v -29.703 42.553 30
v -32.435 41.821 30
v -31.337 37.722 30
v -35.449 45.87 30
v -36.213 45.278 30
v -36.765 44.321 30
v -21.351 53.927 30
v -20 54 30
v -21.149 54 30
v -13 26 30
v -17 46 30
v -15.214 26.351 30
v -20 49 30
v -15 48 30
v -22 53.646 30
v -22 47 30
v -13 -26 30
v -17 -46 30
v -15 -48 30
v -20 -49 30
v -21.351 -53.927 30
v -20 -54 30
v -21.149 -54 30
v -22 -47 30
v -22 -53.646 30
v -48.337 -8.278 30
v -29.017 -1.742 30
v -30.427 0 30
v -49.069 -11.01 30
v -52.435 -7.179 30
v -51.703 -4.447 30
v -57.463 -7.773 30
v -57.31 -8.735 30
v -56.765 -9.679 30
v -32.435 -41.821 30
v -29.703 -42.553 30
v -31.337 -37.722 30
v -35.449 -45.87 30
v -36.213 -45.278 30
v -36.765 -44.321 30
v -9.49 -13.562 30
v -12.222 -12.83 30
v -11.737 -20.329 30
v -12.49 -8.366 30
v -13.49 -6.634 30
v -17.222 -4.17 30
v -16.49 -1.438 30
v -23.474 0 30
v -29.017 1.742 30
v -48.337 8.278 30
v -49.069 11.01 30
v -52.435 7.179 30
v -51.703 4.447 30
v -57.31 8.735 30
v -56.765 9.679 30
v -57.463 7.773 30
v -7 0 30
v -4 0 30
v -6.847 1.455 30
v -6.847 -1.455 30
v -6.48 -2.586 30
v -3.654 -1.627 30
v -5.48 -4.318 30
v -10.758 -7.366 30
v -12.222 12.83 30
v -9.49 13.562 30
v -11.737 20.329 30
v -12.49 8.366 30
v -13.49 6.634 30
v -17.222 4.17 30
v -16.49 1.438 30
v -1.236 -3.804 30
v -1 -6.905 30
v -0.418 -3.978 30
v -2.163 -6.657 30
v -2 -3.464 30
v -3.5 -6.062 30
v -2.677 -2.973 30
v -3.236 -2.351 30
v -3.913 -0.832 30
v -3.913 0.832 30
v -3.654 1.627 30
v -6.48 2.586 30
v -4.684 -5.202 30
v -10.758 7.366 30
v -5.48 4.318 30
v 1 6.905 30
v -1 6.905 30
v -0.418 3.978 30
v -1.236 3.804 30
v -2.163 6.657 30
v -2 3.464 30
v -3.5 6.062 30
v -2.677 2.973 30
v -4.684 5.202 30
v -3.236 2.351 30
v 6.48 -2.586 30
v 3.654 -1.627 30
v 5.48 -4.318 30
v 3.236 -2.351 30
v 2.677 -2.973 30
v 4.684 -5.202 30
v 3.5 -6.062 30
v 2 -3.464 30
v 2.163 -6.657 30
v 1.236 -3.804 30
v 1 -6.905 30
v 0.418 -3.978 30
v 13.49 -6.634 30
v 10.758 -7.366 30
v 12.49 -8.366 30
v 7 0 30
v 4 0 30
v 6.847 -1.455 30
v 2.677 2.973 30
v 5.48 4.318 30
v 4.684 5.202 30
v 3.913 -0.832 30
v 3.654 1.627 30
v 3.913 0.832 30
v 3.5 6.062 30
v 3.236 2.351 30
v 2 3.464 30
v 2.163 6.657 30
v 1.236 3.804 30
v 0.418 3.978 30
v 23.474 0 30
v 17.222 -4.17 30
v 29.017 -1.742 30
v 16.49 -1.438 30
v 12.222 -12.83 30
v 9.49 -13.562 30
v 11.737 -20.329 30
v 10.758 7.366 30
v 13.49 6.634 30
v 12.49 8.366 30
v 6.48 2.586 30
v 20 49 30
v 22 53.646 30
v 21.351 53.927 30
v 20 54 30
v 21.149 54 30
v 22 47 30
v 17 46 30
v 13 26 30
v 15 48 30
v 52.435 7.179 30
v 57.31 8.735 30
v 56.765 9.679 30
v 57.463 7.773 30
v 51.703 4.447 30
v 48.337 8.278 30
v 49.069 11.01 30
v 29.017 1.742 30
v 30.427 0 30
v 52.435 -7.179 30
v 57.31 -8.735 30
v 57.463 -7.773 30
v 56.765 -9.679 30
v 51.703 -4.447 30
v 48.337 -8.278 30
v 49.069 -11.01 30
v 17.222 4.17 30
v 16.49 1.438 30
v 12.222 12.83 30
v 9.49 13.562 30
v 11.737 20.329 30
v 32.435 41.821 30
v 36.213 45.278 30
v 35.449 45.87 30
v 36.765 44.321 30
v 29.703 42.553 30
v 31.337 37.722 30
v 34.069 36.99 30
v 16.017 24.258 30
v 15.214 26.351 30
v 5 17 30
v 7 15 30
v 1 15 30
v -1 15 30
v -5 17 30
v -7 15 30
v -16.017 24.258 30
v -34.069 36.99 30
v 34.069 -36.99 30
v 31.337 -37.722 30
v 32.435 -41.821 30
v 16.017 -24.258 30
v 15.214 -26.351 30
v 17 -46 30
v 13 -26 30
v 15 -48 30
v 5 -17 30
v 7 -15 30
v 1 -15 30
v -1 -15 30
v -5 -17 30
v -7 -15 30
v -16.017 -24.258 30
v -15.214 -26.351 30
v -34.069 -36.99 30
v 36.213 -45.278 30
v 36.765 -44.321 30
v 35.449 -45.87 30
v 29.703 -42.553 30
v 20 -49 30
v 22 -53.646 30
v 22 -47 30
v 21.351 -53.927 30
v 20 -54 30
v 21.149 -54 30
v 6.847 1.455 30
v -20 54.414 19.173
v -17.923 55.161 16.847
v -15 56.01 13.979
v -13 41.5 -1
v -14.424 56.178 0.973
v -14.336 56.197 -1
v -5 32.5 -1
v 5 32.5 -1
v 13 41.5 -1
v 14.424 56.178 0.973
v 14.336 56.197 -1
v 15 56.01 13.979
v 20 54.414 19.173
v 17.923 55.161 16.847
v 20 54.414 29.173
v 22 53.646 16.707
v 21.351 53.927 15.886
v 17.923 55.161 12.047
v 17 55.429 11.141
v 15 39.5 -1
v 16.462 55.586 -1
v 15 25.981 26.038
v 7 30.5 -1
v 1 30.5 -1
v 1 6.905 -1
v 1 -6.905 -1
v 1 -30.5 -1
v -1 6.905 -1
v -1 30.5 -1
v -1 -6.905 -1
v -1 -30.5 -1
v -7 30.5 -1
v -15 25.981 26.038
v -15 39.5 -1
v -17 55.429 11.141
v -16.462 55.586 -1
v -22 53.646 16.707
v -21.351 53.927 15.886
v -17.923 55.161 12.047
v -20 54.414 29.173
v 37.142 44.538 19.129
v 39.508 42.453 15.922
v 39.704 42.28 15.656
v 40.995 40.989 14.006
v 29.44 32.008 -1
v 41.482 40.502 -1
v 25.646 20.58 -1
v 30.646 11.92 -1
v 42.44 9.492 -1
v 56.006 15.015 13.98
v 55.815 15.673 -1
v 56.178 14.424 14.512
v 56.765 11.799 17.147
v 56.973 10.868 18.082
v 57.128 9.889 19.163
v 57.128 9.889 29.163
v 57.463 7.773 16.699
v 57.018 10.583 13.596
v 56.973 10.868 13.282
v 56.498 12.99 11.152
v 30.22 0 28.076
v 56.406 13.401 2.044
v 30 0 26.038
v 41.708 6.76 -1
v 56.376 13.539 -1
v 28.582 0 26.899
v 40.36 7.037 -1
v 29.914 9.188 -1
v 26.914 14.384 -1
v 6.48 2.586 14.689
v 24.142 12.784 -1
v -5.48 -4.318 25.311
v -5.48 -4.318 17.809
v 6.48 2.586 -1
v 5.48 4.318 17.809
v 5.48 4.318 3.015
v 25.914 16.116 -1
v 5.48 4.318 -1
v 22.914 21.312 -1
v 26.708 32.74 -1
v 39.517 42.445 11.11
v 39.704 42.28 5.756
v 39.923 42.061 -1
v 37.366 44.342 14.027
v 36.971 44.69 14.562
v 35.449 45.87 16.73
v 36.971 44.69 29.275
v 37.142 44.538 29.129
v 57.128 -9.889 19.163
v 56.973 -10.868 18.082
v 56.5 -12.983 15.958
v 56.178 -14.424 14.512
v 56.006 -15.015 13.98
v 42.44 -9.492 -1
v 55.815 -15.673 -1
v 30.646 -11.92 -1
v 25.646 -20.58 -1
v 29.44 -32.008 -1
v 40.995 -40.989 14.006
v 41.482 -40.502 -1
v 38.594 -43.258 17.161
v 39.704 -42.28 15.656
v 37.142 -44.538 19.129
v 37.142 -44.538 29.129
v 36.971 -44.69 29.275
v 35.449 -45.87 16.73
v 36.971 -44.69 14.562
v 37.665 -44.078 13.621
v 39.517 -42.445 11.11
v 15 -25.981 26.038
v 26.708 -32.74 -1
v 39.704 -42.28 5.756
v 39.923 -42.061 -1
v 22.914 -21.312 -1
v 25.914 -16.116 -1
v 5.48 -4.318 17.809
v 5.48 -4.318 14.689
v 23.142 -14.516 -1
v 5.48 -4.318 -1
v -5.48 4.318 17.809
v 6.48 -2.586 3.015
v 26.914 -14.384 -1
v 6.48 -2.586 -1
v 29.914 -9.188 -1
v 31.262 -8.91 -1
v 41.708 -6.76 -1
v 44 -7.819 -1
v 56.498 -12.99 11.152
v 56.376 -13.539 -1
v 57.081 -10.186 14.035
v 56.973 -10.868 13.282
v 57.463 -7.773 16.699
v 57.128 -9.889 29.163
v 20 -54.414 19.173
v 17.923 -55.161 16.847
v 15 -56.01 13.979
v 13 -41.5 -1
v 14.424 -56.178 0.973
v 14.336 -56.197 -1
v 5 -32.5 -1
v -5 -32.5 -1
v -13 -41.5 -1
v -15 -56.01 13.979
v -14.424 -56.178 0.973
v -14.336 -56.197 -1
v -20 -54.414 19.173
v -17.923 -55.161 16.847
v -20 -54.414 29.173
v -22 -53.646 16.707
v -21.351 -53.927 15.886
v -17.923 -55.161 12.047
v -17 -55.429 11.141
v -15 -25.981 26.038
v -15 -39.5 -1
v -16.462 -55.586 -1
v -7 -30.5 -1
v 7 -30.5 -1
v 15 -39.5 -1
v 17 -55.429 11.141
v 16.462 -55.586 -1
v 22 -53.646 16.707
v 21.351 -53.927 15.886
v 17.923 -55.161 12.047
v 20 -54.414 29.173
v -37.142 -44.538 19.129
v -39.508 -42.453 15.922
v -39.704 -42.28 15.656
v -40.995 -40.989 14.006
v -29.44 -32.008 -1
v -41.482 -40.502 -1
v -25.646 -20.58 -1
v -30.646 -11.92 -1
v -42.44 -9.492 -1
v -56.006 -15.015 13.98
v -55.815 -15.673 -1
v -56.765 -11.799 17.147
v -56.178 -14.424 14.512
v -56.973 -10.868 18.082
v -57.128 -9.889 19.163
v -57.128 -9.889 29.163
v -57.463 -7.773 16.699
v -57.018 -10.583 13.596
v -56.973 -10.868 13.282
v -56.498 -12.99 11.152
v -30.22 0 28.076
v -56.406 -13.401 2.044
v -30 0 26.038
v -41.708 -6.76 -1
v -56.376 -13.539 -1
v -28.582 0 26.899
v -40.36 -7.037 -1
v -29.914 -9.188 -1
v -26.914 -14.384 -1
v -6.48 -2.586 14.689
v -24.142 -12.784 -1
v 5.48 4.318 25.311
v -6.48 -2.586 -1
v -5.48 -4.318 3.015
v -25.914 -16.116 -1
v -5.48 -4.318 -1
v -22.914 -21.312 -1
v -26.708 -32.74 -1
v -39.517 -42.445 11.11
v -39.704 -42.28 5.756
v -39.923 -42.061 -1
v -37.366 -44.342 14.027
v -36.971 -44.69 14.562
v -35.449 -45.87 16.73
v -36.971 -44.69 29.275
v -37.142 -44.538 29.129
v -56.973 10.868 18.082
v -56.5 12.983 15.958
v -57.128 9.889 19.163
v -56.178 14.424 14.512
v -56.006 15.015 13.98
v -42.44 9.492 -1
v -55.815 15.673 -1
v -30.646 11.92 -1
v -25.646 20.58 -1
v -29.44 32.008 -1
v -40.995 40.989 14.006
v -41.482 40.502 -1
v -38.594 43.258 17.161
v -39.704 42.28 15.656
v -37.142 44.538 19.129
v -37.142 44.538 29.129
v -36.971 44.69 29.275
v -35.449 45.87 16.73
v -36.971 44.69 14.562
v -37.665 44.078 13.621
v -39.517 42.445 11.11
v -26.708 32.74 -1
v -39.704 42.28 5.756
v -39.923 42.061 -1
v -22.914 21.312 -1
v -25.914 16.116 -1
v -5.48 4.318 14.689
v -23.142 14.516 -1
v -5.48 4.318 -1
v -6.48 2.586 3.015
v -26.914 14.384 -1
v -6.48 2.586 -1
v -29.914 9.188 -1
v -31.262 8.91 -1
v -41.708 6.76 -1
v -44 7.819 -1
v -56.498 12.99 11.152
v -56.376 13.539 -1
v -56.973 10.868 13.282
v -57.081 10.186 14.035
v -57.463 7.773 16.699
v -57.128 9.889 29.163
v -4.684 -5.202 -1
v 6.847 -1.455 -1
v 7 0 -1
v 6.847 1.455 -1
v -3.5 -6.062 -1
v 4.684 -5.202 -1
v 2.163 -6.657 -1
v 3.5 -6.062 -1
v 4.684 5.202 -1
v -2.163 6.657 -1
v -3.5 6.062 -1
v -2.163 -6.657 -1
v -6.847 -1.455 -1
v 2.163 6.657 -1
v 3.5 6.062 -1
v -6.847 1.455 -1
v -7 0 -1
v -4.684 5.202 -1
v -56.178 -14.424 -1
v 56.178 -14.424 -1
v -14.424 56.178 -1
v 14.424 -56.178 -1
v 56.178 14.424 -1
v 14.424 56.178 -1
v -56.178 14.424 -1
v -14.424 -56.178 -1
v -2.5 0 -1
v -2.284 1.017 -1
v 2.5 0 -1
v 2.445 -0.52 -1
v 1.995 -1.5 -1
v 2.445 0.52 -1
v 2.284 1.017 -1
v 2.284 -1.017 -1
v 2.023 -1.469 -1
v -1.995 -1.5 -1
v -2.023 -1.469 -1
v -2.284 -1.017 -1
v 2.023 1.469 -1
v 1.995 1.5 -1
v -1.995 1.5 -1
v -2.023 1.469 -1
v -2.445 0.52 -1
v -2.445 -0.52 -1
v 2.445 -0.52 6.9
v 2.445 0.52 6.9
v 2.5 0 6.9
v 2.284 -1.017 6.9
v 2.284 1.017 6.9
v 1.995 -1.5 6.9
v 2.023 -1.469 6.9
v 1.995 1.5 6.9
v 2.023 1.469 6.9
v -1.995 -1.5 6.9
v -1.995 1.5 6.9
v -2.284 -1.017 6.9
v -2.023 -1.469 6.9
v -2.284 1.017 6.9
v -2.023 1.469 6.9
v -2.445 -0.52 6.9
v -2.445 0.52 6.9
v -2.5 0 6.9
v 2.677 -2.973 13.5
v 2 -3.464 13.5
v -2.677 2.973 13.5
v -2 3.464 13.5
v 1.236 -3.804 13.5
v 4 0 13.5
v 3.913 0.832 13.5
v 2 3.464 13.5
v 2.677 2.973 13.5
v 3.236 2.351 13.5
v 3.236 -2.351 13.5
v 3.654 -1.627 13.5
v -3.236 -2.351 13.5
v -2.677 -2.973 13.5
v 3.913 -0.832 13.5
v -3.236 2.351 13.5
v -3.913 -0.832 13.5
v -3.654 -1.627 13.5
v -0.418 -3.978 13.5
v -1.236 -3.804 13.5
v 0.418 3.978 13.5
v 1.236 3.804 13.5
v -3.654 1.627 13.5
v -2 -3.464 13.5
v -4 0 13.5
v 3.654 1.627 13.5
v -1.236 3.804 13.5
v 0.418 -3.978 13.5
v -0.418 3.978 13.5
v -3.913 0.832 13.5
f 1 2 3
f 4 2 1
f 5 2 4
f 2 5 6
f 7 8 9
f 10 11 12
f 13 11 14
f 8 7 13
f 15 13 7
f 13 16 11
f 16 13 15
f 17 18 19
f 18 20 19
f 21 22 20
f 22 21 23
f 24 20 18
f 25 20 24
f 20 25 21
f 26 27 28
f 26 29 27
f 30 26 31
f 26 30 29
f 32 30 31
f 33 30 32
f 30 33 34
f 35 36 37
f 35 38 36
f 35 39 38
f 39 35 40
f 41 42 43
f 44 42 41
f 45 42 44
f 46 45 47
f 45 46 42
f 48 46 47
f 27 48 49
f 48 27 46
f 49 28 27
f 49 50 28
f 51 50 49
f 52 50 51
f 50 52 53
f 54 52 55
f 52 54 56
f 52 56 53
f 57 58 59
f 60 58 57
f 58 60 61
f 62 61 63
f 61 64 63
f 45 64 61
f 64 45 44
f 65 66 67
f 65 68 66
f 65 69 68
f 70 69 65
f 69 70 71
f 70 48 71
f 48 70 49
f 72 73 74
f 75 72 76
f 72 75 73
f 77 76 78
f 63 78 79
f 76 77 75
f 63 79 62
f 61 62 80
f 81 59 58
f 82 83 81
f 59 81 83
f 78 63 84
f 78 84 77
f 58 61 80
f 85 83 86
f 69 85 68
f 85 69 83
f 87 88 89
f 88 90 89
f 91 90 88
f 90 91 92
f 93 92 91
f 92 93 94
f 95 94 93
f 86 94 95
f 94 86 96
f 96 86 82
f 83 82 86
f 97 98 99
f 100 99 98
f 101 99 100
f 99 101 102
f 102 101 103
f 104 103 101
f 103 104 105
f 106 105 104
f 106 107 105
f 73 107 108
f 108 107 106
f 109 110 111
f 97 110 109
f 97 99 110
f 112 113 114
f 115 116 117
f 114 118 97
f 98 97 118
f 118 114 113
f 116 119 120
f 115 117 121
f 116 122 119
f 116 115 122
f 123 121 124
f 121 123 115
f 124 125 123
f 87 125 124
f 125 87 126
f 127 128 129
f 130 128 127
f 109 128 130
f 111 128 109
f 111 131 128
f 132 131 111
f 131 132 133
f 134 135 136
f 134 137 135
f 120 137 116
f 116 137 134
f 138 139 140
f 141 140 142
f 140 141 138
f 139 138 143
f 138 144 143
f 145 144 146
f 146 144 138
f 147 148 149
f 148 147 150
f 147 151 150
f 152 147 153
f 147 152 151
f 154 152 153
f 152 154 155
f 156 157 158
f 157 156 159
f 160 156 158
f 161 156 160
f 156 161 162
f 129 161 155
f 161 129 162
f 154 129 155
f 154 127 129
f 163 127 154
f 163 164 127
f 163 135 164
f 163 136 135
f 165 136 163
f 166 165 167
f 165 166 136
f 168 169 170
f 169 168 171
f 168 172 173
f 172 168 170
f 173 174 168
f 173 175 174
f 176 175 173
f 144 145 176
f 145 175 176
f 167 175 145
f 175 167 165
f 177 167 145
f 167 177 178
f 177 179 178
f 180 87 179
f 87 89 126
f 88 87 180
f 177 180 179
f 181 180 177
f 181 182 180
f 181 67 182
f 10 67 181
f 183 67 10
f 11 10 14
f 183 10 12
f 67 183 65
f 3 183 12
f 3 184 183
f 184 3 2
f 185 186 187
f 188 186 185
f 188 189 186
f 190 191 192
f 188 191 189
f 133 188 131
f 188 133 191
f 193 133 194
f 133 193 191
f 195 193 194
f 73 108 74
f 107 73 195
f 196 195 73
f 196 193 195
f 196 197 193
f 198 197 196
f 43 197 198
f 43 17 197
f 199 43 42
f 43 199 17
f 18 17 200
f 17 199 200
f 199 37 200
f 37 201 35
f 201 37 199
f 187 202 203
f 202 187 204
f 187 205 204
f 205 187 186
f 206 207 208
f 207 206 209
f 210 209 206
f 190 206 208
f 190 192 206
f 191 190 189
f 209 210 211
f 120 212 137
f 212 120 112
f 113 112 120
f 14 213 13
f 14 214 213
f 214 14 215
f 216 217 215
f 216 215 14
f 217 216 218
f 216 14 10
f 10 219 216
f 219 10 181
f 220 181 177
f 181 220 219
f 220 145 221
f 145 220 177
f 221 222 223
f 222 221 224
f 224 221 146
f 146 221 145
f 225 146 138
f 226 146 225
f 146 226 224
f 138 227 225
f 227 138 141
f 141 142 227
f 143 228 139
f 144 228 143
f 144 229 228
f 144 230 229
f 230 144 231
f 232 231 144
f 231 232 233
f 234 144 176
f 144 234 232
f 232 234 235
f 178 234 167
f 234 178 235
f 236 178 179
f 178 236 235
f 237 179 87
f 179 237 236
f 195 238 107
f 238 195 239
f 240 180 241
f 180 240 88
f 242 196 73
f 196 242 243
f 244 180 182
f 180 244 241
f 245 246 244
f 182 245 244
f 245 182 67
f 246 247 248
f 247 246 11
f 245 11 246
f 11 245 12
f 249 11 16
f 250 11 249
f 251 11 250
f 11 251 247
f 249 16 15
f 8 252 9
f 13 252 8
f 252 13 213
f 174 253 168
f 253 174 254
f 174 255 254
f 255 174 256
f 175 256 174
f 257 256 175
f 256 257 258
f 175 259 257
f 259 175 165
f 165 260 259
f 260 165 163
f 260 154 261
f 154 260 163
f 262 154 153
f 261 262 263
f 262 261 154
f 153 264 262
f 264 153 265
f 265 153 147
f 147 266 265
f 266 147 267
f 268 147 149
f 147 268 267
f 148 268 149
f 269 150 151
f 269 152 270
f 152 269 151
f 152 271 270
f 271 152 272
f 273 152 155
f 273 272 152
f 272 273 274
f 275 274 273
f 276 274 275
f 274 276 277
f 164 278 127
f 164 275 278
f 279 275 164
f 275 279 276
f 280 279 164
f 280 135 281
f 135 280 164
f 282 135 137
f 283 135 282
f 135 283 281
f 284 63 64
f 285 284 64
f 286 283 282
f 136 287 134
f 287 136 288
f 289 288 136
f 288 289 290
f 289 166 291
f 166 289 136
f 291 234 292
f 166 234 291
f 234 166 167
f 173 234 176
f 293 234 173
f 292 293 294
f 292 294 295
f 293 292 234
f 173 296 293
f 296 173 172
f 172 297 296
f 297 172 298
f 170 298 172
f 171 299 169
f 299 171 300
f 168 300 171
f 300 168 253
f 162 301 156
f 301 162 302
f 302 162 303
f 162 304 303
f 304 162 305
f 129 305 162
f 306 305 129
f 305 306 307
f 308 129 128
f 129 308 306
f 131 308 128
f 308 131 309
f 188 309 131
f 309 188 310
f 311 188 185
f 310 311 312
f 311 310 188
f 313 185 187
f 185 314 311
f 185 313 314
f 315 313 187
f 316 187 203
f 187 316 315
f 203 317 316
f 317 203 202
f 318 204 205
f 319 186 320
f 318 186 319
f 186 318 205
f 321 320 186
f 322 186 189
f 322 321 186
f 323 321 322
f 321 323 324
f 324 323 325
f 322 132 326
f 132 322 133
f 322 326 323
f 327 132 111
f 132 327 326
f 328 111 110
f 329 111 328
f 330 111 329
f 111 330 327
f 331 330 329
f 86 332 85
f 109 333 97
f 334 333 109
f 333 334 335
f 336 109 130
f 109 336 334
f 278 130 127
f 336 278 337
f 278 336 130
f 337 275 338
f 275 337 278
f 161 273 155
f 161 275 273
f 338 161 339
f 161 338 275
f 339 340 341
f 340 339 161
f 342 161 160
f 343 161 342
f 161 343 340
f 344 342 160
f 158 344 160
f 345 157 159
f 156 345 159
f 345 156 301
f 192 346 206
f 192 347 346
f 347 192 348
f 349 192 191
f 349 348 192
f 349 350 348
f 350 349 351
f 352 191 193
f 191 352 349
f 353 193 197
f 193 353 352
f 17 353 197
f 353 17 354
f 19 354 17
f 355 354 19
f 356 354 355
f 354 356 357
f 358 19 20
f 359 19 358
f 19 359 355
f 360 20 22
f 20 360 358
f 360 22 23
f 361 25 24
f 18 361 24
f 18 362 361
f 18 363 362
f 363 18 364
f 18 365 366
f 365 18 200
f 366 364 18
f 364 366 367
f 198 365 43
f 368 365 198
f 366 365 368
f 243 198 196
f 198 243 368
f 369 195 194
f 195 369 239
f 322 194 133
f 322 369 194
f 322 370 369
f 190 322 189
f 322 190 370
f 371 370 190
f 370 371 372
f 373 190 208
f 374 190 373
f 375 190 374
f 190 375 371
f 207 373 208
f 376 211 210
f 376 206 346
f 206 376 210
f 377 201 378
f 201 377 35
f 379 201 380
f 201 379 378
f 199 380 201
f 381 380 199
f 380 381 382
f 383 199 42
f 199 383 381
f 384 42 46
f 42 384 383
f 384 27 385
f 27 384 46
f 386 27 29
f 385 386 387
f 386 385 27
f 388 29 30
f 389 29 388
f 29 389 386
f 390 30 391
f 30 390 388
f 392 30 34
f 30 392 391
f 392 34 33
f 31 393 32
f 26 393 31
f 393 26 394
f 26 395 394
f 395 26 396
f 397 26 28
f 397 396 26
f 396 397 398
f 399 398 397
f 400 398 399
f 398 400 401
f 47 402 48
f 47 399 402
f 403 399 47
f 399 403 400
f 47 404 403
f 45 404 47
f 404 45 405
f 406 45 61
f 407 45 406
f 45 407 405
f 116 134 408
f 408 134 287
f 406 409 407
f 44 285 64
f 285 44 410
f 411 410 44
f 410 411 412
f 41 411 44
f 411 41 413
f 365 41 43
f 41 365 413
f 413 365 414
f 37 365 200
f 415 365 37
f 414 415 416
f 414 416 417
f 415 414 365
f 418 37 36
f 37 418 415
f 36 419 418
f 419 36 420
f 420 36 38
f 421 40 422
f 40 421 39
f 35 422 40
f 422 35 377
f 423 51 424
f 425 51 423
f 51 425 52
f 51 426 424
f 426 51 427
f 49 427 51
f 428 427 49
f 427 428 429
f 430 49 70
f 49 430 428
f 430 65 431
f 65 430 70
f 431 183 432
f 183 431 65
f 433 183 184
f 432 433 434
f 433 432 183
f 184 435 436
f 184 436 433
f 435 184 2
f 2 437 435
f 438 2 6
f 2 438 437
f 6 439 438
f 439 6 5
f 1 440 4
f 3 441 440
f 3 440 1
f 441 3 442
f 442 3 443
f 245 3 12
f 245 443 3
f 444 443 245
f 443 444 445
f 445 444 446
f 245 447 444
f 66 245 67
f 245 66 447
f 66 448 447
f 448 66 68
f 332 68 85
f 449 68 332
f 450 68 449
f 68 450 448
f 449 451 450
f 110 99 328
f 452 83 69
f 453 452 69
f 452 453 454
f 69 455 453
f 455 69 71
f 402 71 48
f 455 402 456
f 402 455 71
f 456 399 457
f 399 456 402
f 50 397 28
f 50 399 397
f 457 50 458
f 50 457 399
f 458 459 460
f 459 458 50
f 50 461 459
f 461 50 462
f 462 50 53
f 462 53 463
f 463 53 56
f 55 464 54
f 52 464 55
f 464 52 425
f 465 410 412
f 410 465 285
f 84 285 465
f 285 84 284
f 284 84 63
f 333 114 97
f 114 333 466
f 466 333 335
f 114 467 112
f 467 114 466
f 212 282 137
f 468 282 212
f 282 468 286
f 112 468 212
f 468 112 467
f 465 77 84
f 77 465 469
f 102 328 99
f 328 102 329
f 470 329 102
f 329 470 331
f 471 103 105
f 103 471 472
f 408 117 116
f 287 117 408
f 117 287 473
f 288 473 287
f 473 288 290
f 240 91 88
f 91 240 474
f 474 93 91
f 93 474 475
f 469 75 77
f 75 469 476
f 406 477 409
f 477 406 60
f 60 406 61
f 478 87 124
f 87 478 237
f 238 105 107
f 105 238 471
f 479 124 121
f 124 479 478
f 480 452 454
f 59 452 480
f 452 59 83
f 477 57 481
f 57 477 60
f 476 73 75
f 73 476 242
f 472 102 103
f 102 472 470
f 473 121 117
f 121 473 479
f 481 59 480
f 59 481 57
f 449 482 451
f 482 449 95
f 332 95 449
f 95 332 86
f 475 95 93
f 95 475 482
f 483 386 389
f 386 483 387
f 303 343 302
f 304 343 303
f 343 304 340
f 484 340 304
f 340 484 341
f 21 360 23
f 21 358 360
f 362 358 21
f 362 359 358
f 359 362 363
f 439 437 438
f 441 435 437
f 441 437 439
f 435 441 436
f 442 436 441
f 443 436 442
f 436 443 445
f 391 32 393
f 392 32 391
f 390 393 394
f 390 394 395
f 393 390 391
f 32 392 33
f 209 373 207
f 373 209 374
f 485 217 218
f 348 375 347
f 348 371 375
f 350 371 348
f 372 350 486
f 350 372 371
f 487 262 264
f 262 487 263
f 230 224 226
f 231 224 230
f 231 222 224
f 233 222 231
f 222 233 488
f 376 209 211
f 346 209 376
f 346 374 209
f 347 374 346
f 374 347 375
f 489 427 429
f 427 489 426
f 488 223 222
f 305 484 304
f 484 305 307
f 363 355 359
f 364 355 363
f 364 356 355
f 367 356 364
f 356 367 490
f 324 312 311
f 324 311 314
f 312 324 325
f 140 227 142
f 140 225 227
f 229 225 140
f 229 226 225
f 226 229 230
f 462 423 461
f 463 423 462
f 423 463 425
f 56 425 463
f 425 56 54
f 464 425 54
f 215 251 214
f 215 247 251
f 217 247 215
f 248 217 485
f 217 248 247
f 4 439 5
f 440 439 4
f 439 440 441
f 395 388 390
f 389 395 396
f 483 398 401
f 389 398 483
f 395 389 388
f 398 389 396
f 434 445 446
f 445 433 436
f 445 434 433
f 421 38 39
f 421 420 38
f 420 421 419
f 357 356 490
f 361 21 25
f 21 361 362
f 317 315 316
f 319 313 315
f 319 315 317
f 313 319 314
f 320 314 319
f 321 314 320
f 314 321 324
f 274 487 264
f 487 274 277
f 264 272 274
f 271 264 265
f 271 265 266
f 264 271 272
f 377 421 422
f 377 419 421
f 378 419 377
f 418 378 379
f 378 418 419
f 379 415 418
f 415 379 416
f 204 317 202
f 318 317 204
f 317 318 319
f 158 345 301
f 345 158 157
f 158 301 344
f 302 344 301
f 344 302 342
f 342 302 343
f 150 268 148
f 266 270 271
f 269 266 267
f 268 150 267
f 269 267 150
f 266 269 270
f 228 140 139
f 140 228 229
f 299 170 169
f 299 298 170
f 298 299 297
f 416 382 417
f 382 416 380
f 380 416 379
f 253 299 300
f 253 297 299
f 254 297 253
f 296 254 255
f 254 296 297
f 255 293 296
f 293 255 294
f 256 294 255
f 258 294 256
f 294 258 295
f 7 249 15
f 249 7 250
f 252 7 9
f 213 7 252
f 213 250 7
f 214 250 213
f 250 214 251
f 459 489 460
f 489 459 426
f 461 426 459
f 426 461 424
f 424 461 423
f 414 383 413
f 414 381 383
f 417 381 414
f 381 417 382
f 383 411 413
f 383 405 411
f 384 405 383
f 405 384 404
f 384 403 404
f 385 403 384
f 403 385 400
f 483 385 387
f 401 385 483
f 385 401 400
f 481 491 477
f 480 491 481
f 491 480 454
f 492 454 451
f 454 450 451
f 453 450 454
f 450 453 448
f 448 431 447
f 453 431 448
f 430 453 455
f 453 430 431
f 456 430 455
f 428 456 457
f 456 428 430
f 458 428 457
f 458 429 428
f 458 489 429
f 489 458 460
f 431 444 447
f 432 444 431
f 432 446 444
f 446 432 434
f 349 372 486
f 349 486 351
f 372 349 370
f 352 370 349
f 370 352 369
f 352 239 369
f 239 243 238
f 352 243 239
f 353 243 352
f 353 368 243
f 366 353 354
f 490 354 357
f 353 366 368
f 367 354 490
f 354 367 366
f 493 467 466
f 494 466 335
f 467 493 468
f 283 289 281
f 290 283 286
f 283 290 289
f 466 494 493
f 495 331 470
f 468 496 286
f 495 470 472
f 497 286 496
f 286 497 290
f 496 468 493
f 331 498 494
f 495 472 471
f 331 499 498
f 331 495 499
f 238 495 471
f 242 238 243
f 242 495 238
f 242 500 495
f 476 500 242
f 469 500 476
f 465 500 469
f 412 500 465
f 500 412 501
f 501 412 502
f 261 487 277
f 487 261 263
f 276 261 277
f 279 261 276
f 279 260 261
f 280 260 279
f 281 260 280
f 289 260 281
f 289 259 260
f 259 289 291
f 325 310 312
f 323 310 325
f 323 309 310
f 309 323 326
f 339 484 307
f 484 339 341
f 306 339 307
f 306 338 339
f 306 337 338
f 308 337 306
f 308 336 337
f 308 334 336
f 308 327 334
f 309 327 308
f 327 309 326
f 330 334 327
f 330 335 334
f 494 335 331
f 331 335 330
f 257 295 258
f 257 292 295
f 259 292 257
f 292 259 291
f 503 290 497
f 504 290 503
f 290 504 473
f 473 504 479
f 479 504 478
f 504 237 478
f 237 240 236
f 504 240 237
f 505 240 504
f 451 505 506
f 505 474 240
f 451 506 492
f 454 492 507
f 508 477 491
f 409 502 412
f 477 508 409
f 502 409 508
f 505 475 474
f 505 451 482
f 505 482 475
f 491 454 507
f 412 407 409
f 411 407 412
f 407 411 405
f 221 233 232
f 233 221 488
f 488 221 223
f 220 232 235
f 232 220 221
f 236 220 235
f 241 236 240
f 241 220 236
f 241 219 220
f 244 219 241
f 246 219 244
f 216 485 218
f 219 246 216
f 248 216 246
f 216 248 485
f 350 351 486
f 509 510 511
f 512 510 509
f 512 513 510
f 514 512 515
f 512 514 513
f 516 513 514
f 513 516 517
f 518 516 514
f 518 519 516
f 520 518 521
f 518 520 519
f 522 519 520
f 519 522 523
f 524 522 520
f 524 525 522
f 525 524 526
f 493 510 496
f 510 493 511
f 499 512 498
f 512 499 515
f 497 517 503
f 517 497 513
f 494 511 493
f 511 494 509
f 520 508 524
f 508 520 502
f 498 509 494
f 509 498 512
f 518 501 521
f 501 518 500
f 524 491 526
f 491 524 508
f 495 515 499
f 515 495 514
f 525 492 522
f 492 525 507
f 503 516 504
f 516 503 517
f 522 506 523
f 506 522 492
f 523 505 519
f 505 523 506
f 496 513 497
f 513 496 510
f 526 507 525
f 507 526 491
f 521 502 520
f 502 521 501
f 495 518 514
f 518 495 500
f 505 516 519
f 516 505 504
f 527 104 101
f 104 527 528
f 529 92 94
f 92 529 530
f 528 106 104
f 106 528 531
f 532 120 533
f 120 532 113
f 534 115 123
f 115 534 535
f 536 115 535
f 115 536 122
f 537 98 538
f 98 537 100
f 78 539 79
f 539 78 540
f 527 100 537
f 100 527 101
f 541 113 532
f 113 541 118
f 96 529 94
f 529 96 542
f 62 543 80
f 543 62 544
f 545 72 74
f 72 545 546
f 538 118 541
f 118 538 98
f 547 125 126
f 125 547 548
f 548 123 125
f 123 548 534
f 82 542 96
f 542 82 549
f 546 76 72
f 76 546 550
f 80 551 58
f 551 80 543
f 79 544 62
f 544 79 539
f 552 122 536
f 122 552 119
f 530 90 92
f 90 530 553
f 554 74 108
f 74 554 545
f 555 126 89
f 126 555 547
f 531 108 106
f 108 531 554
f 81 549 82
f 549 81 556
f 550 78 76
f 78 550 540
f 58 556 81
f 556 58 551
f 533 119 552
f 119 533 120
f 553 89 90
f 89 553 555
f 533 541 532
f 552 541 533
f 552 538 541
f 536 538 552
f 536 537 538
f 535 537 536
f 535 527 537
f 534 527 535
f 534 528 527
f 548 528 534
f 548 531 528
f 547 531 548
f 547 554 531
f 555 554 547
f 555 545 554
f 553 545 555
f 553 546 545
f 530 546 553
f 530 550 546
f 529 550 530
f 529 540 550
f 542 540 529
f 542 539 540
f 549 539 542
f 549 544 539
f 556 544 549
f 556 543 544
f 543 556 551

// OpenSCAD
// file: poddispenser_common.scad
// approximates a capsule 
module capsule_cutout() {
    polygon(points=[[-20,0],[20,0],[20,3],[15,4],[13,26],[5,35],[-5,35],[-13,26],[-15,4],[-20,3]]);
}

// ouline of capsule + 2mm wall
module capsule_cutout_outer() {
    polygon(points=[[-22,-2],[22,-2],[22,5],[17,6],[15,28],[7,37],[1,37],[1,47],[-1,47],[-1,37],[-7,37],[-15,28],[-17,6],[-22,5]]);
}

// inner + outer capsule, open at the end
module capsule_outline_open() {
    polygon(points=[[20,0],[20,3],[15,4],[13,26],[5,35],
                            [-5,35],[-13,26],[-15,4],[-20,3],[-20,-2],
                            [-22,-2],[-22,5],[-17,6],[-15,28],[-7,37],
                            [-1,37],[-1,65],[1,65],[1,37],
                            [7,37],[15,28],[17,6],[22,5],[22,-2],[20,-2]]);
    
    
}
// main file
use <poddispenser_common.scad>

// allows capsules to slide out sideways if permitted by release
// radius is the inner diameter of the pod dispenser's wall (the ejector can't reach that far)

module poddispenser_ejector(radius=60,height=35) {
    m = [[ 1, 0, 0, 0],
         [ 0, 1, -0.5, 0],
         [ 0, 0, 1, 0],
         [ 0, 0, 0, 1]];
    difference() {
        intersection() {
            union() {
                cylinder($fn=30,h=height,r=7);
                for (angle=[0,60,120,180,240,300]) {
                    rotate([0,0,angle]) translate([0,-52,0]) multmatrix(m) 
                    linear_extrude(height=height) 
                        capsule_outline_open();
                }
            }
            cylinder($fn=100, r=radius-2, h=height-4);
        }
        union() {
            // the top screwhole is an 8mm rod, or close enough
            translate([0,0,-1]) cylinder($fn=30,h=height/2,r=4);
            // the bottom axle hole is a 5mm cylinder flattened to 3mm on the side
            translate([0,0,height*0.66])
            intersection() {
                 cylinder($fn=30,h=height,r=2.5);
                cube([5,3,20],center=true);
            }
        }
    }
}

translate([0,0,30]) 
rotate([180,0,0]) poddispenser_ejector();
